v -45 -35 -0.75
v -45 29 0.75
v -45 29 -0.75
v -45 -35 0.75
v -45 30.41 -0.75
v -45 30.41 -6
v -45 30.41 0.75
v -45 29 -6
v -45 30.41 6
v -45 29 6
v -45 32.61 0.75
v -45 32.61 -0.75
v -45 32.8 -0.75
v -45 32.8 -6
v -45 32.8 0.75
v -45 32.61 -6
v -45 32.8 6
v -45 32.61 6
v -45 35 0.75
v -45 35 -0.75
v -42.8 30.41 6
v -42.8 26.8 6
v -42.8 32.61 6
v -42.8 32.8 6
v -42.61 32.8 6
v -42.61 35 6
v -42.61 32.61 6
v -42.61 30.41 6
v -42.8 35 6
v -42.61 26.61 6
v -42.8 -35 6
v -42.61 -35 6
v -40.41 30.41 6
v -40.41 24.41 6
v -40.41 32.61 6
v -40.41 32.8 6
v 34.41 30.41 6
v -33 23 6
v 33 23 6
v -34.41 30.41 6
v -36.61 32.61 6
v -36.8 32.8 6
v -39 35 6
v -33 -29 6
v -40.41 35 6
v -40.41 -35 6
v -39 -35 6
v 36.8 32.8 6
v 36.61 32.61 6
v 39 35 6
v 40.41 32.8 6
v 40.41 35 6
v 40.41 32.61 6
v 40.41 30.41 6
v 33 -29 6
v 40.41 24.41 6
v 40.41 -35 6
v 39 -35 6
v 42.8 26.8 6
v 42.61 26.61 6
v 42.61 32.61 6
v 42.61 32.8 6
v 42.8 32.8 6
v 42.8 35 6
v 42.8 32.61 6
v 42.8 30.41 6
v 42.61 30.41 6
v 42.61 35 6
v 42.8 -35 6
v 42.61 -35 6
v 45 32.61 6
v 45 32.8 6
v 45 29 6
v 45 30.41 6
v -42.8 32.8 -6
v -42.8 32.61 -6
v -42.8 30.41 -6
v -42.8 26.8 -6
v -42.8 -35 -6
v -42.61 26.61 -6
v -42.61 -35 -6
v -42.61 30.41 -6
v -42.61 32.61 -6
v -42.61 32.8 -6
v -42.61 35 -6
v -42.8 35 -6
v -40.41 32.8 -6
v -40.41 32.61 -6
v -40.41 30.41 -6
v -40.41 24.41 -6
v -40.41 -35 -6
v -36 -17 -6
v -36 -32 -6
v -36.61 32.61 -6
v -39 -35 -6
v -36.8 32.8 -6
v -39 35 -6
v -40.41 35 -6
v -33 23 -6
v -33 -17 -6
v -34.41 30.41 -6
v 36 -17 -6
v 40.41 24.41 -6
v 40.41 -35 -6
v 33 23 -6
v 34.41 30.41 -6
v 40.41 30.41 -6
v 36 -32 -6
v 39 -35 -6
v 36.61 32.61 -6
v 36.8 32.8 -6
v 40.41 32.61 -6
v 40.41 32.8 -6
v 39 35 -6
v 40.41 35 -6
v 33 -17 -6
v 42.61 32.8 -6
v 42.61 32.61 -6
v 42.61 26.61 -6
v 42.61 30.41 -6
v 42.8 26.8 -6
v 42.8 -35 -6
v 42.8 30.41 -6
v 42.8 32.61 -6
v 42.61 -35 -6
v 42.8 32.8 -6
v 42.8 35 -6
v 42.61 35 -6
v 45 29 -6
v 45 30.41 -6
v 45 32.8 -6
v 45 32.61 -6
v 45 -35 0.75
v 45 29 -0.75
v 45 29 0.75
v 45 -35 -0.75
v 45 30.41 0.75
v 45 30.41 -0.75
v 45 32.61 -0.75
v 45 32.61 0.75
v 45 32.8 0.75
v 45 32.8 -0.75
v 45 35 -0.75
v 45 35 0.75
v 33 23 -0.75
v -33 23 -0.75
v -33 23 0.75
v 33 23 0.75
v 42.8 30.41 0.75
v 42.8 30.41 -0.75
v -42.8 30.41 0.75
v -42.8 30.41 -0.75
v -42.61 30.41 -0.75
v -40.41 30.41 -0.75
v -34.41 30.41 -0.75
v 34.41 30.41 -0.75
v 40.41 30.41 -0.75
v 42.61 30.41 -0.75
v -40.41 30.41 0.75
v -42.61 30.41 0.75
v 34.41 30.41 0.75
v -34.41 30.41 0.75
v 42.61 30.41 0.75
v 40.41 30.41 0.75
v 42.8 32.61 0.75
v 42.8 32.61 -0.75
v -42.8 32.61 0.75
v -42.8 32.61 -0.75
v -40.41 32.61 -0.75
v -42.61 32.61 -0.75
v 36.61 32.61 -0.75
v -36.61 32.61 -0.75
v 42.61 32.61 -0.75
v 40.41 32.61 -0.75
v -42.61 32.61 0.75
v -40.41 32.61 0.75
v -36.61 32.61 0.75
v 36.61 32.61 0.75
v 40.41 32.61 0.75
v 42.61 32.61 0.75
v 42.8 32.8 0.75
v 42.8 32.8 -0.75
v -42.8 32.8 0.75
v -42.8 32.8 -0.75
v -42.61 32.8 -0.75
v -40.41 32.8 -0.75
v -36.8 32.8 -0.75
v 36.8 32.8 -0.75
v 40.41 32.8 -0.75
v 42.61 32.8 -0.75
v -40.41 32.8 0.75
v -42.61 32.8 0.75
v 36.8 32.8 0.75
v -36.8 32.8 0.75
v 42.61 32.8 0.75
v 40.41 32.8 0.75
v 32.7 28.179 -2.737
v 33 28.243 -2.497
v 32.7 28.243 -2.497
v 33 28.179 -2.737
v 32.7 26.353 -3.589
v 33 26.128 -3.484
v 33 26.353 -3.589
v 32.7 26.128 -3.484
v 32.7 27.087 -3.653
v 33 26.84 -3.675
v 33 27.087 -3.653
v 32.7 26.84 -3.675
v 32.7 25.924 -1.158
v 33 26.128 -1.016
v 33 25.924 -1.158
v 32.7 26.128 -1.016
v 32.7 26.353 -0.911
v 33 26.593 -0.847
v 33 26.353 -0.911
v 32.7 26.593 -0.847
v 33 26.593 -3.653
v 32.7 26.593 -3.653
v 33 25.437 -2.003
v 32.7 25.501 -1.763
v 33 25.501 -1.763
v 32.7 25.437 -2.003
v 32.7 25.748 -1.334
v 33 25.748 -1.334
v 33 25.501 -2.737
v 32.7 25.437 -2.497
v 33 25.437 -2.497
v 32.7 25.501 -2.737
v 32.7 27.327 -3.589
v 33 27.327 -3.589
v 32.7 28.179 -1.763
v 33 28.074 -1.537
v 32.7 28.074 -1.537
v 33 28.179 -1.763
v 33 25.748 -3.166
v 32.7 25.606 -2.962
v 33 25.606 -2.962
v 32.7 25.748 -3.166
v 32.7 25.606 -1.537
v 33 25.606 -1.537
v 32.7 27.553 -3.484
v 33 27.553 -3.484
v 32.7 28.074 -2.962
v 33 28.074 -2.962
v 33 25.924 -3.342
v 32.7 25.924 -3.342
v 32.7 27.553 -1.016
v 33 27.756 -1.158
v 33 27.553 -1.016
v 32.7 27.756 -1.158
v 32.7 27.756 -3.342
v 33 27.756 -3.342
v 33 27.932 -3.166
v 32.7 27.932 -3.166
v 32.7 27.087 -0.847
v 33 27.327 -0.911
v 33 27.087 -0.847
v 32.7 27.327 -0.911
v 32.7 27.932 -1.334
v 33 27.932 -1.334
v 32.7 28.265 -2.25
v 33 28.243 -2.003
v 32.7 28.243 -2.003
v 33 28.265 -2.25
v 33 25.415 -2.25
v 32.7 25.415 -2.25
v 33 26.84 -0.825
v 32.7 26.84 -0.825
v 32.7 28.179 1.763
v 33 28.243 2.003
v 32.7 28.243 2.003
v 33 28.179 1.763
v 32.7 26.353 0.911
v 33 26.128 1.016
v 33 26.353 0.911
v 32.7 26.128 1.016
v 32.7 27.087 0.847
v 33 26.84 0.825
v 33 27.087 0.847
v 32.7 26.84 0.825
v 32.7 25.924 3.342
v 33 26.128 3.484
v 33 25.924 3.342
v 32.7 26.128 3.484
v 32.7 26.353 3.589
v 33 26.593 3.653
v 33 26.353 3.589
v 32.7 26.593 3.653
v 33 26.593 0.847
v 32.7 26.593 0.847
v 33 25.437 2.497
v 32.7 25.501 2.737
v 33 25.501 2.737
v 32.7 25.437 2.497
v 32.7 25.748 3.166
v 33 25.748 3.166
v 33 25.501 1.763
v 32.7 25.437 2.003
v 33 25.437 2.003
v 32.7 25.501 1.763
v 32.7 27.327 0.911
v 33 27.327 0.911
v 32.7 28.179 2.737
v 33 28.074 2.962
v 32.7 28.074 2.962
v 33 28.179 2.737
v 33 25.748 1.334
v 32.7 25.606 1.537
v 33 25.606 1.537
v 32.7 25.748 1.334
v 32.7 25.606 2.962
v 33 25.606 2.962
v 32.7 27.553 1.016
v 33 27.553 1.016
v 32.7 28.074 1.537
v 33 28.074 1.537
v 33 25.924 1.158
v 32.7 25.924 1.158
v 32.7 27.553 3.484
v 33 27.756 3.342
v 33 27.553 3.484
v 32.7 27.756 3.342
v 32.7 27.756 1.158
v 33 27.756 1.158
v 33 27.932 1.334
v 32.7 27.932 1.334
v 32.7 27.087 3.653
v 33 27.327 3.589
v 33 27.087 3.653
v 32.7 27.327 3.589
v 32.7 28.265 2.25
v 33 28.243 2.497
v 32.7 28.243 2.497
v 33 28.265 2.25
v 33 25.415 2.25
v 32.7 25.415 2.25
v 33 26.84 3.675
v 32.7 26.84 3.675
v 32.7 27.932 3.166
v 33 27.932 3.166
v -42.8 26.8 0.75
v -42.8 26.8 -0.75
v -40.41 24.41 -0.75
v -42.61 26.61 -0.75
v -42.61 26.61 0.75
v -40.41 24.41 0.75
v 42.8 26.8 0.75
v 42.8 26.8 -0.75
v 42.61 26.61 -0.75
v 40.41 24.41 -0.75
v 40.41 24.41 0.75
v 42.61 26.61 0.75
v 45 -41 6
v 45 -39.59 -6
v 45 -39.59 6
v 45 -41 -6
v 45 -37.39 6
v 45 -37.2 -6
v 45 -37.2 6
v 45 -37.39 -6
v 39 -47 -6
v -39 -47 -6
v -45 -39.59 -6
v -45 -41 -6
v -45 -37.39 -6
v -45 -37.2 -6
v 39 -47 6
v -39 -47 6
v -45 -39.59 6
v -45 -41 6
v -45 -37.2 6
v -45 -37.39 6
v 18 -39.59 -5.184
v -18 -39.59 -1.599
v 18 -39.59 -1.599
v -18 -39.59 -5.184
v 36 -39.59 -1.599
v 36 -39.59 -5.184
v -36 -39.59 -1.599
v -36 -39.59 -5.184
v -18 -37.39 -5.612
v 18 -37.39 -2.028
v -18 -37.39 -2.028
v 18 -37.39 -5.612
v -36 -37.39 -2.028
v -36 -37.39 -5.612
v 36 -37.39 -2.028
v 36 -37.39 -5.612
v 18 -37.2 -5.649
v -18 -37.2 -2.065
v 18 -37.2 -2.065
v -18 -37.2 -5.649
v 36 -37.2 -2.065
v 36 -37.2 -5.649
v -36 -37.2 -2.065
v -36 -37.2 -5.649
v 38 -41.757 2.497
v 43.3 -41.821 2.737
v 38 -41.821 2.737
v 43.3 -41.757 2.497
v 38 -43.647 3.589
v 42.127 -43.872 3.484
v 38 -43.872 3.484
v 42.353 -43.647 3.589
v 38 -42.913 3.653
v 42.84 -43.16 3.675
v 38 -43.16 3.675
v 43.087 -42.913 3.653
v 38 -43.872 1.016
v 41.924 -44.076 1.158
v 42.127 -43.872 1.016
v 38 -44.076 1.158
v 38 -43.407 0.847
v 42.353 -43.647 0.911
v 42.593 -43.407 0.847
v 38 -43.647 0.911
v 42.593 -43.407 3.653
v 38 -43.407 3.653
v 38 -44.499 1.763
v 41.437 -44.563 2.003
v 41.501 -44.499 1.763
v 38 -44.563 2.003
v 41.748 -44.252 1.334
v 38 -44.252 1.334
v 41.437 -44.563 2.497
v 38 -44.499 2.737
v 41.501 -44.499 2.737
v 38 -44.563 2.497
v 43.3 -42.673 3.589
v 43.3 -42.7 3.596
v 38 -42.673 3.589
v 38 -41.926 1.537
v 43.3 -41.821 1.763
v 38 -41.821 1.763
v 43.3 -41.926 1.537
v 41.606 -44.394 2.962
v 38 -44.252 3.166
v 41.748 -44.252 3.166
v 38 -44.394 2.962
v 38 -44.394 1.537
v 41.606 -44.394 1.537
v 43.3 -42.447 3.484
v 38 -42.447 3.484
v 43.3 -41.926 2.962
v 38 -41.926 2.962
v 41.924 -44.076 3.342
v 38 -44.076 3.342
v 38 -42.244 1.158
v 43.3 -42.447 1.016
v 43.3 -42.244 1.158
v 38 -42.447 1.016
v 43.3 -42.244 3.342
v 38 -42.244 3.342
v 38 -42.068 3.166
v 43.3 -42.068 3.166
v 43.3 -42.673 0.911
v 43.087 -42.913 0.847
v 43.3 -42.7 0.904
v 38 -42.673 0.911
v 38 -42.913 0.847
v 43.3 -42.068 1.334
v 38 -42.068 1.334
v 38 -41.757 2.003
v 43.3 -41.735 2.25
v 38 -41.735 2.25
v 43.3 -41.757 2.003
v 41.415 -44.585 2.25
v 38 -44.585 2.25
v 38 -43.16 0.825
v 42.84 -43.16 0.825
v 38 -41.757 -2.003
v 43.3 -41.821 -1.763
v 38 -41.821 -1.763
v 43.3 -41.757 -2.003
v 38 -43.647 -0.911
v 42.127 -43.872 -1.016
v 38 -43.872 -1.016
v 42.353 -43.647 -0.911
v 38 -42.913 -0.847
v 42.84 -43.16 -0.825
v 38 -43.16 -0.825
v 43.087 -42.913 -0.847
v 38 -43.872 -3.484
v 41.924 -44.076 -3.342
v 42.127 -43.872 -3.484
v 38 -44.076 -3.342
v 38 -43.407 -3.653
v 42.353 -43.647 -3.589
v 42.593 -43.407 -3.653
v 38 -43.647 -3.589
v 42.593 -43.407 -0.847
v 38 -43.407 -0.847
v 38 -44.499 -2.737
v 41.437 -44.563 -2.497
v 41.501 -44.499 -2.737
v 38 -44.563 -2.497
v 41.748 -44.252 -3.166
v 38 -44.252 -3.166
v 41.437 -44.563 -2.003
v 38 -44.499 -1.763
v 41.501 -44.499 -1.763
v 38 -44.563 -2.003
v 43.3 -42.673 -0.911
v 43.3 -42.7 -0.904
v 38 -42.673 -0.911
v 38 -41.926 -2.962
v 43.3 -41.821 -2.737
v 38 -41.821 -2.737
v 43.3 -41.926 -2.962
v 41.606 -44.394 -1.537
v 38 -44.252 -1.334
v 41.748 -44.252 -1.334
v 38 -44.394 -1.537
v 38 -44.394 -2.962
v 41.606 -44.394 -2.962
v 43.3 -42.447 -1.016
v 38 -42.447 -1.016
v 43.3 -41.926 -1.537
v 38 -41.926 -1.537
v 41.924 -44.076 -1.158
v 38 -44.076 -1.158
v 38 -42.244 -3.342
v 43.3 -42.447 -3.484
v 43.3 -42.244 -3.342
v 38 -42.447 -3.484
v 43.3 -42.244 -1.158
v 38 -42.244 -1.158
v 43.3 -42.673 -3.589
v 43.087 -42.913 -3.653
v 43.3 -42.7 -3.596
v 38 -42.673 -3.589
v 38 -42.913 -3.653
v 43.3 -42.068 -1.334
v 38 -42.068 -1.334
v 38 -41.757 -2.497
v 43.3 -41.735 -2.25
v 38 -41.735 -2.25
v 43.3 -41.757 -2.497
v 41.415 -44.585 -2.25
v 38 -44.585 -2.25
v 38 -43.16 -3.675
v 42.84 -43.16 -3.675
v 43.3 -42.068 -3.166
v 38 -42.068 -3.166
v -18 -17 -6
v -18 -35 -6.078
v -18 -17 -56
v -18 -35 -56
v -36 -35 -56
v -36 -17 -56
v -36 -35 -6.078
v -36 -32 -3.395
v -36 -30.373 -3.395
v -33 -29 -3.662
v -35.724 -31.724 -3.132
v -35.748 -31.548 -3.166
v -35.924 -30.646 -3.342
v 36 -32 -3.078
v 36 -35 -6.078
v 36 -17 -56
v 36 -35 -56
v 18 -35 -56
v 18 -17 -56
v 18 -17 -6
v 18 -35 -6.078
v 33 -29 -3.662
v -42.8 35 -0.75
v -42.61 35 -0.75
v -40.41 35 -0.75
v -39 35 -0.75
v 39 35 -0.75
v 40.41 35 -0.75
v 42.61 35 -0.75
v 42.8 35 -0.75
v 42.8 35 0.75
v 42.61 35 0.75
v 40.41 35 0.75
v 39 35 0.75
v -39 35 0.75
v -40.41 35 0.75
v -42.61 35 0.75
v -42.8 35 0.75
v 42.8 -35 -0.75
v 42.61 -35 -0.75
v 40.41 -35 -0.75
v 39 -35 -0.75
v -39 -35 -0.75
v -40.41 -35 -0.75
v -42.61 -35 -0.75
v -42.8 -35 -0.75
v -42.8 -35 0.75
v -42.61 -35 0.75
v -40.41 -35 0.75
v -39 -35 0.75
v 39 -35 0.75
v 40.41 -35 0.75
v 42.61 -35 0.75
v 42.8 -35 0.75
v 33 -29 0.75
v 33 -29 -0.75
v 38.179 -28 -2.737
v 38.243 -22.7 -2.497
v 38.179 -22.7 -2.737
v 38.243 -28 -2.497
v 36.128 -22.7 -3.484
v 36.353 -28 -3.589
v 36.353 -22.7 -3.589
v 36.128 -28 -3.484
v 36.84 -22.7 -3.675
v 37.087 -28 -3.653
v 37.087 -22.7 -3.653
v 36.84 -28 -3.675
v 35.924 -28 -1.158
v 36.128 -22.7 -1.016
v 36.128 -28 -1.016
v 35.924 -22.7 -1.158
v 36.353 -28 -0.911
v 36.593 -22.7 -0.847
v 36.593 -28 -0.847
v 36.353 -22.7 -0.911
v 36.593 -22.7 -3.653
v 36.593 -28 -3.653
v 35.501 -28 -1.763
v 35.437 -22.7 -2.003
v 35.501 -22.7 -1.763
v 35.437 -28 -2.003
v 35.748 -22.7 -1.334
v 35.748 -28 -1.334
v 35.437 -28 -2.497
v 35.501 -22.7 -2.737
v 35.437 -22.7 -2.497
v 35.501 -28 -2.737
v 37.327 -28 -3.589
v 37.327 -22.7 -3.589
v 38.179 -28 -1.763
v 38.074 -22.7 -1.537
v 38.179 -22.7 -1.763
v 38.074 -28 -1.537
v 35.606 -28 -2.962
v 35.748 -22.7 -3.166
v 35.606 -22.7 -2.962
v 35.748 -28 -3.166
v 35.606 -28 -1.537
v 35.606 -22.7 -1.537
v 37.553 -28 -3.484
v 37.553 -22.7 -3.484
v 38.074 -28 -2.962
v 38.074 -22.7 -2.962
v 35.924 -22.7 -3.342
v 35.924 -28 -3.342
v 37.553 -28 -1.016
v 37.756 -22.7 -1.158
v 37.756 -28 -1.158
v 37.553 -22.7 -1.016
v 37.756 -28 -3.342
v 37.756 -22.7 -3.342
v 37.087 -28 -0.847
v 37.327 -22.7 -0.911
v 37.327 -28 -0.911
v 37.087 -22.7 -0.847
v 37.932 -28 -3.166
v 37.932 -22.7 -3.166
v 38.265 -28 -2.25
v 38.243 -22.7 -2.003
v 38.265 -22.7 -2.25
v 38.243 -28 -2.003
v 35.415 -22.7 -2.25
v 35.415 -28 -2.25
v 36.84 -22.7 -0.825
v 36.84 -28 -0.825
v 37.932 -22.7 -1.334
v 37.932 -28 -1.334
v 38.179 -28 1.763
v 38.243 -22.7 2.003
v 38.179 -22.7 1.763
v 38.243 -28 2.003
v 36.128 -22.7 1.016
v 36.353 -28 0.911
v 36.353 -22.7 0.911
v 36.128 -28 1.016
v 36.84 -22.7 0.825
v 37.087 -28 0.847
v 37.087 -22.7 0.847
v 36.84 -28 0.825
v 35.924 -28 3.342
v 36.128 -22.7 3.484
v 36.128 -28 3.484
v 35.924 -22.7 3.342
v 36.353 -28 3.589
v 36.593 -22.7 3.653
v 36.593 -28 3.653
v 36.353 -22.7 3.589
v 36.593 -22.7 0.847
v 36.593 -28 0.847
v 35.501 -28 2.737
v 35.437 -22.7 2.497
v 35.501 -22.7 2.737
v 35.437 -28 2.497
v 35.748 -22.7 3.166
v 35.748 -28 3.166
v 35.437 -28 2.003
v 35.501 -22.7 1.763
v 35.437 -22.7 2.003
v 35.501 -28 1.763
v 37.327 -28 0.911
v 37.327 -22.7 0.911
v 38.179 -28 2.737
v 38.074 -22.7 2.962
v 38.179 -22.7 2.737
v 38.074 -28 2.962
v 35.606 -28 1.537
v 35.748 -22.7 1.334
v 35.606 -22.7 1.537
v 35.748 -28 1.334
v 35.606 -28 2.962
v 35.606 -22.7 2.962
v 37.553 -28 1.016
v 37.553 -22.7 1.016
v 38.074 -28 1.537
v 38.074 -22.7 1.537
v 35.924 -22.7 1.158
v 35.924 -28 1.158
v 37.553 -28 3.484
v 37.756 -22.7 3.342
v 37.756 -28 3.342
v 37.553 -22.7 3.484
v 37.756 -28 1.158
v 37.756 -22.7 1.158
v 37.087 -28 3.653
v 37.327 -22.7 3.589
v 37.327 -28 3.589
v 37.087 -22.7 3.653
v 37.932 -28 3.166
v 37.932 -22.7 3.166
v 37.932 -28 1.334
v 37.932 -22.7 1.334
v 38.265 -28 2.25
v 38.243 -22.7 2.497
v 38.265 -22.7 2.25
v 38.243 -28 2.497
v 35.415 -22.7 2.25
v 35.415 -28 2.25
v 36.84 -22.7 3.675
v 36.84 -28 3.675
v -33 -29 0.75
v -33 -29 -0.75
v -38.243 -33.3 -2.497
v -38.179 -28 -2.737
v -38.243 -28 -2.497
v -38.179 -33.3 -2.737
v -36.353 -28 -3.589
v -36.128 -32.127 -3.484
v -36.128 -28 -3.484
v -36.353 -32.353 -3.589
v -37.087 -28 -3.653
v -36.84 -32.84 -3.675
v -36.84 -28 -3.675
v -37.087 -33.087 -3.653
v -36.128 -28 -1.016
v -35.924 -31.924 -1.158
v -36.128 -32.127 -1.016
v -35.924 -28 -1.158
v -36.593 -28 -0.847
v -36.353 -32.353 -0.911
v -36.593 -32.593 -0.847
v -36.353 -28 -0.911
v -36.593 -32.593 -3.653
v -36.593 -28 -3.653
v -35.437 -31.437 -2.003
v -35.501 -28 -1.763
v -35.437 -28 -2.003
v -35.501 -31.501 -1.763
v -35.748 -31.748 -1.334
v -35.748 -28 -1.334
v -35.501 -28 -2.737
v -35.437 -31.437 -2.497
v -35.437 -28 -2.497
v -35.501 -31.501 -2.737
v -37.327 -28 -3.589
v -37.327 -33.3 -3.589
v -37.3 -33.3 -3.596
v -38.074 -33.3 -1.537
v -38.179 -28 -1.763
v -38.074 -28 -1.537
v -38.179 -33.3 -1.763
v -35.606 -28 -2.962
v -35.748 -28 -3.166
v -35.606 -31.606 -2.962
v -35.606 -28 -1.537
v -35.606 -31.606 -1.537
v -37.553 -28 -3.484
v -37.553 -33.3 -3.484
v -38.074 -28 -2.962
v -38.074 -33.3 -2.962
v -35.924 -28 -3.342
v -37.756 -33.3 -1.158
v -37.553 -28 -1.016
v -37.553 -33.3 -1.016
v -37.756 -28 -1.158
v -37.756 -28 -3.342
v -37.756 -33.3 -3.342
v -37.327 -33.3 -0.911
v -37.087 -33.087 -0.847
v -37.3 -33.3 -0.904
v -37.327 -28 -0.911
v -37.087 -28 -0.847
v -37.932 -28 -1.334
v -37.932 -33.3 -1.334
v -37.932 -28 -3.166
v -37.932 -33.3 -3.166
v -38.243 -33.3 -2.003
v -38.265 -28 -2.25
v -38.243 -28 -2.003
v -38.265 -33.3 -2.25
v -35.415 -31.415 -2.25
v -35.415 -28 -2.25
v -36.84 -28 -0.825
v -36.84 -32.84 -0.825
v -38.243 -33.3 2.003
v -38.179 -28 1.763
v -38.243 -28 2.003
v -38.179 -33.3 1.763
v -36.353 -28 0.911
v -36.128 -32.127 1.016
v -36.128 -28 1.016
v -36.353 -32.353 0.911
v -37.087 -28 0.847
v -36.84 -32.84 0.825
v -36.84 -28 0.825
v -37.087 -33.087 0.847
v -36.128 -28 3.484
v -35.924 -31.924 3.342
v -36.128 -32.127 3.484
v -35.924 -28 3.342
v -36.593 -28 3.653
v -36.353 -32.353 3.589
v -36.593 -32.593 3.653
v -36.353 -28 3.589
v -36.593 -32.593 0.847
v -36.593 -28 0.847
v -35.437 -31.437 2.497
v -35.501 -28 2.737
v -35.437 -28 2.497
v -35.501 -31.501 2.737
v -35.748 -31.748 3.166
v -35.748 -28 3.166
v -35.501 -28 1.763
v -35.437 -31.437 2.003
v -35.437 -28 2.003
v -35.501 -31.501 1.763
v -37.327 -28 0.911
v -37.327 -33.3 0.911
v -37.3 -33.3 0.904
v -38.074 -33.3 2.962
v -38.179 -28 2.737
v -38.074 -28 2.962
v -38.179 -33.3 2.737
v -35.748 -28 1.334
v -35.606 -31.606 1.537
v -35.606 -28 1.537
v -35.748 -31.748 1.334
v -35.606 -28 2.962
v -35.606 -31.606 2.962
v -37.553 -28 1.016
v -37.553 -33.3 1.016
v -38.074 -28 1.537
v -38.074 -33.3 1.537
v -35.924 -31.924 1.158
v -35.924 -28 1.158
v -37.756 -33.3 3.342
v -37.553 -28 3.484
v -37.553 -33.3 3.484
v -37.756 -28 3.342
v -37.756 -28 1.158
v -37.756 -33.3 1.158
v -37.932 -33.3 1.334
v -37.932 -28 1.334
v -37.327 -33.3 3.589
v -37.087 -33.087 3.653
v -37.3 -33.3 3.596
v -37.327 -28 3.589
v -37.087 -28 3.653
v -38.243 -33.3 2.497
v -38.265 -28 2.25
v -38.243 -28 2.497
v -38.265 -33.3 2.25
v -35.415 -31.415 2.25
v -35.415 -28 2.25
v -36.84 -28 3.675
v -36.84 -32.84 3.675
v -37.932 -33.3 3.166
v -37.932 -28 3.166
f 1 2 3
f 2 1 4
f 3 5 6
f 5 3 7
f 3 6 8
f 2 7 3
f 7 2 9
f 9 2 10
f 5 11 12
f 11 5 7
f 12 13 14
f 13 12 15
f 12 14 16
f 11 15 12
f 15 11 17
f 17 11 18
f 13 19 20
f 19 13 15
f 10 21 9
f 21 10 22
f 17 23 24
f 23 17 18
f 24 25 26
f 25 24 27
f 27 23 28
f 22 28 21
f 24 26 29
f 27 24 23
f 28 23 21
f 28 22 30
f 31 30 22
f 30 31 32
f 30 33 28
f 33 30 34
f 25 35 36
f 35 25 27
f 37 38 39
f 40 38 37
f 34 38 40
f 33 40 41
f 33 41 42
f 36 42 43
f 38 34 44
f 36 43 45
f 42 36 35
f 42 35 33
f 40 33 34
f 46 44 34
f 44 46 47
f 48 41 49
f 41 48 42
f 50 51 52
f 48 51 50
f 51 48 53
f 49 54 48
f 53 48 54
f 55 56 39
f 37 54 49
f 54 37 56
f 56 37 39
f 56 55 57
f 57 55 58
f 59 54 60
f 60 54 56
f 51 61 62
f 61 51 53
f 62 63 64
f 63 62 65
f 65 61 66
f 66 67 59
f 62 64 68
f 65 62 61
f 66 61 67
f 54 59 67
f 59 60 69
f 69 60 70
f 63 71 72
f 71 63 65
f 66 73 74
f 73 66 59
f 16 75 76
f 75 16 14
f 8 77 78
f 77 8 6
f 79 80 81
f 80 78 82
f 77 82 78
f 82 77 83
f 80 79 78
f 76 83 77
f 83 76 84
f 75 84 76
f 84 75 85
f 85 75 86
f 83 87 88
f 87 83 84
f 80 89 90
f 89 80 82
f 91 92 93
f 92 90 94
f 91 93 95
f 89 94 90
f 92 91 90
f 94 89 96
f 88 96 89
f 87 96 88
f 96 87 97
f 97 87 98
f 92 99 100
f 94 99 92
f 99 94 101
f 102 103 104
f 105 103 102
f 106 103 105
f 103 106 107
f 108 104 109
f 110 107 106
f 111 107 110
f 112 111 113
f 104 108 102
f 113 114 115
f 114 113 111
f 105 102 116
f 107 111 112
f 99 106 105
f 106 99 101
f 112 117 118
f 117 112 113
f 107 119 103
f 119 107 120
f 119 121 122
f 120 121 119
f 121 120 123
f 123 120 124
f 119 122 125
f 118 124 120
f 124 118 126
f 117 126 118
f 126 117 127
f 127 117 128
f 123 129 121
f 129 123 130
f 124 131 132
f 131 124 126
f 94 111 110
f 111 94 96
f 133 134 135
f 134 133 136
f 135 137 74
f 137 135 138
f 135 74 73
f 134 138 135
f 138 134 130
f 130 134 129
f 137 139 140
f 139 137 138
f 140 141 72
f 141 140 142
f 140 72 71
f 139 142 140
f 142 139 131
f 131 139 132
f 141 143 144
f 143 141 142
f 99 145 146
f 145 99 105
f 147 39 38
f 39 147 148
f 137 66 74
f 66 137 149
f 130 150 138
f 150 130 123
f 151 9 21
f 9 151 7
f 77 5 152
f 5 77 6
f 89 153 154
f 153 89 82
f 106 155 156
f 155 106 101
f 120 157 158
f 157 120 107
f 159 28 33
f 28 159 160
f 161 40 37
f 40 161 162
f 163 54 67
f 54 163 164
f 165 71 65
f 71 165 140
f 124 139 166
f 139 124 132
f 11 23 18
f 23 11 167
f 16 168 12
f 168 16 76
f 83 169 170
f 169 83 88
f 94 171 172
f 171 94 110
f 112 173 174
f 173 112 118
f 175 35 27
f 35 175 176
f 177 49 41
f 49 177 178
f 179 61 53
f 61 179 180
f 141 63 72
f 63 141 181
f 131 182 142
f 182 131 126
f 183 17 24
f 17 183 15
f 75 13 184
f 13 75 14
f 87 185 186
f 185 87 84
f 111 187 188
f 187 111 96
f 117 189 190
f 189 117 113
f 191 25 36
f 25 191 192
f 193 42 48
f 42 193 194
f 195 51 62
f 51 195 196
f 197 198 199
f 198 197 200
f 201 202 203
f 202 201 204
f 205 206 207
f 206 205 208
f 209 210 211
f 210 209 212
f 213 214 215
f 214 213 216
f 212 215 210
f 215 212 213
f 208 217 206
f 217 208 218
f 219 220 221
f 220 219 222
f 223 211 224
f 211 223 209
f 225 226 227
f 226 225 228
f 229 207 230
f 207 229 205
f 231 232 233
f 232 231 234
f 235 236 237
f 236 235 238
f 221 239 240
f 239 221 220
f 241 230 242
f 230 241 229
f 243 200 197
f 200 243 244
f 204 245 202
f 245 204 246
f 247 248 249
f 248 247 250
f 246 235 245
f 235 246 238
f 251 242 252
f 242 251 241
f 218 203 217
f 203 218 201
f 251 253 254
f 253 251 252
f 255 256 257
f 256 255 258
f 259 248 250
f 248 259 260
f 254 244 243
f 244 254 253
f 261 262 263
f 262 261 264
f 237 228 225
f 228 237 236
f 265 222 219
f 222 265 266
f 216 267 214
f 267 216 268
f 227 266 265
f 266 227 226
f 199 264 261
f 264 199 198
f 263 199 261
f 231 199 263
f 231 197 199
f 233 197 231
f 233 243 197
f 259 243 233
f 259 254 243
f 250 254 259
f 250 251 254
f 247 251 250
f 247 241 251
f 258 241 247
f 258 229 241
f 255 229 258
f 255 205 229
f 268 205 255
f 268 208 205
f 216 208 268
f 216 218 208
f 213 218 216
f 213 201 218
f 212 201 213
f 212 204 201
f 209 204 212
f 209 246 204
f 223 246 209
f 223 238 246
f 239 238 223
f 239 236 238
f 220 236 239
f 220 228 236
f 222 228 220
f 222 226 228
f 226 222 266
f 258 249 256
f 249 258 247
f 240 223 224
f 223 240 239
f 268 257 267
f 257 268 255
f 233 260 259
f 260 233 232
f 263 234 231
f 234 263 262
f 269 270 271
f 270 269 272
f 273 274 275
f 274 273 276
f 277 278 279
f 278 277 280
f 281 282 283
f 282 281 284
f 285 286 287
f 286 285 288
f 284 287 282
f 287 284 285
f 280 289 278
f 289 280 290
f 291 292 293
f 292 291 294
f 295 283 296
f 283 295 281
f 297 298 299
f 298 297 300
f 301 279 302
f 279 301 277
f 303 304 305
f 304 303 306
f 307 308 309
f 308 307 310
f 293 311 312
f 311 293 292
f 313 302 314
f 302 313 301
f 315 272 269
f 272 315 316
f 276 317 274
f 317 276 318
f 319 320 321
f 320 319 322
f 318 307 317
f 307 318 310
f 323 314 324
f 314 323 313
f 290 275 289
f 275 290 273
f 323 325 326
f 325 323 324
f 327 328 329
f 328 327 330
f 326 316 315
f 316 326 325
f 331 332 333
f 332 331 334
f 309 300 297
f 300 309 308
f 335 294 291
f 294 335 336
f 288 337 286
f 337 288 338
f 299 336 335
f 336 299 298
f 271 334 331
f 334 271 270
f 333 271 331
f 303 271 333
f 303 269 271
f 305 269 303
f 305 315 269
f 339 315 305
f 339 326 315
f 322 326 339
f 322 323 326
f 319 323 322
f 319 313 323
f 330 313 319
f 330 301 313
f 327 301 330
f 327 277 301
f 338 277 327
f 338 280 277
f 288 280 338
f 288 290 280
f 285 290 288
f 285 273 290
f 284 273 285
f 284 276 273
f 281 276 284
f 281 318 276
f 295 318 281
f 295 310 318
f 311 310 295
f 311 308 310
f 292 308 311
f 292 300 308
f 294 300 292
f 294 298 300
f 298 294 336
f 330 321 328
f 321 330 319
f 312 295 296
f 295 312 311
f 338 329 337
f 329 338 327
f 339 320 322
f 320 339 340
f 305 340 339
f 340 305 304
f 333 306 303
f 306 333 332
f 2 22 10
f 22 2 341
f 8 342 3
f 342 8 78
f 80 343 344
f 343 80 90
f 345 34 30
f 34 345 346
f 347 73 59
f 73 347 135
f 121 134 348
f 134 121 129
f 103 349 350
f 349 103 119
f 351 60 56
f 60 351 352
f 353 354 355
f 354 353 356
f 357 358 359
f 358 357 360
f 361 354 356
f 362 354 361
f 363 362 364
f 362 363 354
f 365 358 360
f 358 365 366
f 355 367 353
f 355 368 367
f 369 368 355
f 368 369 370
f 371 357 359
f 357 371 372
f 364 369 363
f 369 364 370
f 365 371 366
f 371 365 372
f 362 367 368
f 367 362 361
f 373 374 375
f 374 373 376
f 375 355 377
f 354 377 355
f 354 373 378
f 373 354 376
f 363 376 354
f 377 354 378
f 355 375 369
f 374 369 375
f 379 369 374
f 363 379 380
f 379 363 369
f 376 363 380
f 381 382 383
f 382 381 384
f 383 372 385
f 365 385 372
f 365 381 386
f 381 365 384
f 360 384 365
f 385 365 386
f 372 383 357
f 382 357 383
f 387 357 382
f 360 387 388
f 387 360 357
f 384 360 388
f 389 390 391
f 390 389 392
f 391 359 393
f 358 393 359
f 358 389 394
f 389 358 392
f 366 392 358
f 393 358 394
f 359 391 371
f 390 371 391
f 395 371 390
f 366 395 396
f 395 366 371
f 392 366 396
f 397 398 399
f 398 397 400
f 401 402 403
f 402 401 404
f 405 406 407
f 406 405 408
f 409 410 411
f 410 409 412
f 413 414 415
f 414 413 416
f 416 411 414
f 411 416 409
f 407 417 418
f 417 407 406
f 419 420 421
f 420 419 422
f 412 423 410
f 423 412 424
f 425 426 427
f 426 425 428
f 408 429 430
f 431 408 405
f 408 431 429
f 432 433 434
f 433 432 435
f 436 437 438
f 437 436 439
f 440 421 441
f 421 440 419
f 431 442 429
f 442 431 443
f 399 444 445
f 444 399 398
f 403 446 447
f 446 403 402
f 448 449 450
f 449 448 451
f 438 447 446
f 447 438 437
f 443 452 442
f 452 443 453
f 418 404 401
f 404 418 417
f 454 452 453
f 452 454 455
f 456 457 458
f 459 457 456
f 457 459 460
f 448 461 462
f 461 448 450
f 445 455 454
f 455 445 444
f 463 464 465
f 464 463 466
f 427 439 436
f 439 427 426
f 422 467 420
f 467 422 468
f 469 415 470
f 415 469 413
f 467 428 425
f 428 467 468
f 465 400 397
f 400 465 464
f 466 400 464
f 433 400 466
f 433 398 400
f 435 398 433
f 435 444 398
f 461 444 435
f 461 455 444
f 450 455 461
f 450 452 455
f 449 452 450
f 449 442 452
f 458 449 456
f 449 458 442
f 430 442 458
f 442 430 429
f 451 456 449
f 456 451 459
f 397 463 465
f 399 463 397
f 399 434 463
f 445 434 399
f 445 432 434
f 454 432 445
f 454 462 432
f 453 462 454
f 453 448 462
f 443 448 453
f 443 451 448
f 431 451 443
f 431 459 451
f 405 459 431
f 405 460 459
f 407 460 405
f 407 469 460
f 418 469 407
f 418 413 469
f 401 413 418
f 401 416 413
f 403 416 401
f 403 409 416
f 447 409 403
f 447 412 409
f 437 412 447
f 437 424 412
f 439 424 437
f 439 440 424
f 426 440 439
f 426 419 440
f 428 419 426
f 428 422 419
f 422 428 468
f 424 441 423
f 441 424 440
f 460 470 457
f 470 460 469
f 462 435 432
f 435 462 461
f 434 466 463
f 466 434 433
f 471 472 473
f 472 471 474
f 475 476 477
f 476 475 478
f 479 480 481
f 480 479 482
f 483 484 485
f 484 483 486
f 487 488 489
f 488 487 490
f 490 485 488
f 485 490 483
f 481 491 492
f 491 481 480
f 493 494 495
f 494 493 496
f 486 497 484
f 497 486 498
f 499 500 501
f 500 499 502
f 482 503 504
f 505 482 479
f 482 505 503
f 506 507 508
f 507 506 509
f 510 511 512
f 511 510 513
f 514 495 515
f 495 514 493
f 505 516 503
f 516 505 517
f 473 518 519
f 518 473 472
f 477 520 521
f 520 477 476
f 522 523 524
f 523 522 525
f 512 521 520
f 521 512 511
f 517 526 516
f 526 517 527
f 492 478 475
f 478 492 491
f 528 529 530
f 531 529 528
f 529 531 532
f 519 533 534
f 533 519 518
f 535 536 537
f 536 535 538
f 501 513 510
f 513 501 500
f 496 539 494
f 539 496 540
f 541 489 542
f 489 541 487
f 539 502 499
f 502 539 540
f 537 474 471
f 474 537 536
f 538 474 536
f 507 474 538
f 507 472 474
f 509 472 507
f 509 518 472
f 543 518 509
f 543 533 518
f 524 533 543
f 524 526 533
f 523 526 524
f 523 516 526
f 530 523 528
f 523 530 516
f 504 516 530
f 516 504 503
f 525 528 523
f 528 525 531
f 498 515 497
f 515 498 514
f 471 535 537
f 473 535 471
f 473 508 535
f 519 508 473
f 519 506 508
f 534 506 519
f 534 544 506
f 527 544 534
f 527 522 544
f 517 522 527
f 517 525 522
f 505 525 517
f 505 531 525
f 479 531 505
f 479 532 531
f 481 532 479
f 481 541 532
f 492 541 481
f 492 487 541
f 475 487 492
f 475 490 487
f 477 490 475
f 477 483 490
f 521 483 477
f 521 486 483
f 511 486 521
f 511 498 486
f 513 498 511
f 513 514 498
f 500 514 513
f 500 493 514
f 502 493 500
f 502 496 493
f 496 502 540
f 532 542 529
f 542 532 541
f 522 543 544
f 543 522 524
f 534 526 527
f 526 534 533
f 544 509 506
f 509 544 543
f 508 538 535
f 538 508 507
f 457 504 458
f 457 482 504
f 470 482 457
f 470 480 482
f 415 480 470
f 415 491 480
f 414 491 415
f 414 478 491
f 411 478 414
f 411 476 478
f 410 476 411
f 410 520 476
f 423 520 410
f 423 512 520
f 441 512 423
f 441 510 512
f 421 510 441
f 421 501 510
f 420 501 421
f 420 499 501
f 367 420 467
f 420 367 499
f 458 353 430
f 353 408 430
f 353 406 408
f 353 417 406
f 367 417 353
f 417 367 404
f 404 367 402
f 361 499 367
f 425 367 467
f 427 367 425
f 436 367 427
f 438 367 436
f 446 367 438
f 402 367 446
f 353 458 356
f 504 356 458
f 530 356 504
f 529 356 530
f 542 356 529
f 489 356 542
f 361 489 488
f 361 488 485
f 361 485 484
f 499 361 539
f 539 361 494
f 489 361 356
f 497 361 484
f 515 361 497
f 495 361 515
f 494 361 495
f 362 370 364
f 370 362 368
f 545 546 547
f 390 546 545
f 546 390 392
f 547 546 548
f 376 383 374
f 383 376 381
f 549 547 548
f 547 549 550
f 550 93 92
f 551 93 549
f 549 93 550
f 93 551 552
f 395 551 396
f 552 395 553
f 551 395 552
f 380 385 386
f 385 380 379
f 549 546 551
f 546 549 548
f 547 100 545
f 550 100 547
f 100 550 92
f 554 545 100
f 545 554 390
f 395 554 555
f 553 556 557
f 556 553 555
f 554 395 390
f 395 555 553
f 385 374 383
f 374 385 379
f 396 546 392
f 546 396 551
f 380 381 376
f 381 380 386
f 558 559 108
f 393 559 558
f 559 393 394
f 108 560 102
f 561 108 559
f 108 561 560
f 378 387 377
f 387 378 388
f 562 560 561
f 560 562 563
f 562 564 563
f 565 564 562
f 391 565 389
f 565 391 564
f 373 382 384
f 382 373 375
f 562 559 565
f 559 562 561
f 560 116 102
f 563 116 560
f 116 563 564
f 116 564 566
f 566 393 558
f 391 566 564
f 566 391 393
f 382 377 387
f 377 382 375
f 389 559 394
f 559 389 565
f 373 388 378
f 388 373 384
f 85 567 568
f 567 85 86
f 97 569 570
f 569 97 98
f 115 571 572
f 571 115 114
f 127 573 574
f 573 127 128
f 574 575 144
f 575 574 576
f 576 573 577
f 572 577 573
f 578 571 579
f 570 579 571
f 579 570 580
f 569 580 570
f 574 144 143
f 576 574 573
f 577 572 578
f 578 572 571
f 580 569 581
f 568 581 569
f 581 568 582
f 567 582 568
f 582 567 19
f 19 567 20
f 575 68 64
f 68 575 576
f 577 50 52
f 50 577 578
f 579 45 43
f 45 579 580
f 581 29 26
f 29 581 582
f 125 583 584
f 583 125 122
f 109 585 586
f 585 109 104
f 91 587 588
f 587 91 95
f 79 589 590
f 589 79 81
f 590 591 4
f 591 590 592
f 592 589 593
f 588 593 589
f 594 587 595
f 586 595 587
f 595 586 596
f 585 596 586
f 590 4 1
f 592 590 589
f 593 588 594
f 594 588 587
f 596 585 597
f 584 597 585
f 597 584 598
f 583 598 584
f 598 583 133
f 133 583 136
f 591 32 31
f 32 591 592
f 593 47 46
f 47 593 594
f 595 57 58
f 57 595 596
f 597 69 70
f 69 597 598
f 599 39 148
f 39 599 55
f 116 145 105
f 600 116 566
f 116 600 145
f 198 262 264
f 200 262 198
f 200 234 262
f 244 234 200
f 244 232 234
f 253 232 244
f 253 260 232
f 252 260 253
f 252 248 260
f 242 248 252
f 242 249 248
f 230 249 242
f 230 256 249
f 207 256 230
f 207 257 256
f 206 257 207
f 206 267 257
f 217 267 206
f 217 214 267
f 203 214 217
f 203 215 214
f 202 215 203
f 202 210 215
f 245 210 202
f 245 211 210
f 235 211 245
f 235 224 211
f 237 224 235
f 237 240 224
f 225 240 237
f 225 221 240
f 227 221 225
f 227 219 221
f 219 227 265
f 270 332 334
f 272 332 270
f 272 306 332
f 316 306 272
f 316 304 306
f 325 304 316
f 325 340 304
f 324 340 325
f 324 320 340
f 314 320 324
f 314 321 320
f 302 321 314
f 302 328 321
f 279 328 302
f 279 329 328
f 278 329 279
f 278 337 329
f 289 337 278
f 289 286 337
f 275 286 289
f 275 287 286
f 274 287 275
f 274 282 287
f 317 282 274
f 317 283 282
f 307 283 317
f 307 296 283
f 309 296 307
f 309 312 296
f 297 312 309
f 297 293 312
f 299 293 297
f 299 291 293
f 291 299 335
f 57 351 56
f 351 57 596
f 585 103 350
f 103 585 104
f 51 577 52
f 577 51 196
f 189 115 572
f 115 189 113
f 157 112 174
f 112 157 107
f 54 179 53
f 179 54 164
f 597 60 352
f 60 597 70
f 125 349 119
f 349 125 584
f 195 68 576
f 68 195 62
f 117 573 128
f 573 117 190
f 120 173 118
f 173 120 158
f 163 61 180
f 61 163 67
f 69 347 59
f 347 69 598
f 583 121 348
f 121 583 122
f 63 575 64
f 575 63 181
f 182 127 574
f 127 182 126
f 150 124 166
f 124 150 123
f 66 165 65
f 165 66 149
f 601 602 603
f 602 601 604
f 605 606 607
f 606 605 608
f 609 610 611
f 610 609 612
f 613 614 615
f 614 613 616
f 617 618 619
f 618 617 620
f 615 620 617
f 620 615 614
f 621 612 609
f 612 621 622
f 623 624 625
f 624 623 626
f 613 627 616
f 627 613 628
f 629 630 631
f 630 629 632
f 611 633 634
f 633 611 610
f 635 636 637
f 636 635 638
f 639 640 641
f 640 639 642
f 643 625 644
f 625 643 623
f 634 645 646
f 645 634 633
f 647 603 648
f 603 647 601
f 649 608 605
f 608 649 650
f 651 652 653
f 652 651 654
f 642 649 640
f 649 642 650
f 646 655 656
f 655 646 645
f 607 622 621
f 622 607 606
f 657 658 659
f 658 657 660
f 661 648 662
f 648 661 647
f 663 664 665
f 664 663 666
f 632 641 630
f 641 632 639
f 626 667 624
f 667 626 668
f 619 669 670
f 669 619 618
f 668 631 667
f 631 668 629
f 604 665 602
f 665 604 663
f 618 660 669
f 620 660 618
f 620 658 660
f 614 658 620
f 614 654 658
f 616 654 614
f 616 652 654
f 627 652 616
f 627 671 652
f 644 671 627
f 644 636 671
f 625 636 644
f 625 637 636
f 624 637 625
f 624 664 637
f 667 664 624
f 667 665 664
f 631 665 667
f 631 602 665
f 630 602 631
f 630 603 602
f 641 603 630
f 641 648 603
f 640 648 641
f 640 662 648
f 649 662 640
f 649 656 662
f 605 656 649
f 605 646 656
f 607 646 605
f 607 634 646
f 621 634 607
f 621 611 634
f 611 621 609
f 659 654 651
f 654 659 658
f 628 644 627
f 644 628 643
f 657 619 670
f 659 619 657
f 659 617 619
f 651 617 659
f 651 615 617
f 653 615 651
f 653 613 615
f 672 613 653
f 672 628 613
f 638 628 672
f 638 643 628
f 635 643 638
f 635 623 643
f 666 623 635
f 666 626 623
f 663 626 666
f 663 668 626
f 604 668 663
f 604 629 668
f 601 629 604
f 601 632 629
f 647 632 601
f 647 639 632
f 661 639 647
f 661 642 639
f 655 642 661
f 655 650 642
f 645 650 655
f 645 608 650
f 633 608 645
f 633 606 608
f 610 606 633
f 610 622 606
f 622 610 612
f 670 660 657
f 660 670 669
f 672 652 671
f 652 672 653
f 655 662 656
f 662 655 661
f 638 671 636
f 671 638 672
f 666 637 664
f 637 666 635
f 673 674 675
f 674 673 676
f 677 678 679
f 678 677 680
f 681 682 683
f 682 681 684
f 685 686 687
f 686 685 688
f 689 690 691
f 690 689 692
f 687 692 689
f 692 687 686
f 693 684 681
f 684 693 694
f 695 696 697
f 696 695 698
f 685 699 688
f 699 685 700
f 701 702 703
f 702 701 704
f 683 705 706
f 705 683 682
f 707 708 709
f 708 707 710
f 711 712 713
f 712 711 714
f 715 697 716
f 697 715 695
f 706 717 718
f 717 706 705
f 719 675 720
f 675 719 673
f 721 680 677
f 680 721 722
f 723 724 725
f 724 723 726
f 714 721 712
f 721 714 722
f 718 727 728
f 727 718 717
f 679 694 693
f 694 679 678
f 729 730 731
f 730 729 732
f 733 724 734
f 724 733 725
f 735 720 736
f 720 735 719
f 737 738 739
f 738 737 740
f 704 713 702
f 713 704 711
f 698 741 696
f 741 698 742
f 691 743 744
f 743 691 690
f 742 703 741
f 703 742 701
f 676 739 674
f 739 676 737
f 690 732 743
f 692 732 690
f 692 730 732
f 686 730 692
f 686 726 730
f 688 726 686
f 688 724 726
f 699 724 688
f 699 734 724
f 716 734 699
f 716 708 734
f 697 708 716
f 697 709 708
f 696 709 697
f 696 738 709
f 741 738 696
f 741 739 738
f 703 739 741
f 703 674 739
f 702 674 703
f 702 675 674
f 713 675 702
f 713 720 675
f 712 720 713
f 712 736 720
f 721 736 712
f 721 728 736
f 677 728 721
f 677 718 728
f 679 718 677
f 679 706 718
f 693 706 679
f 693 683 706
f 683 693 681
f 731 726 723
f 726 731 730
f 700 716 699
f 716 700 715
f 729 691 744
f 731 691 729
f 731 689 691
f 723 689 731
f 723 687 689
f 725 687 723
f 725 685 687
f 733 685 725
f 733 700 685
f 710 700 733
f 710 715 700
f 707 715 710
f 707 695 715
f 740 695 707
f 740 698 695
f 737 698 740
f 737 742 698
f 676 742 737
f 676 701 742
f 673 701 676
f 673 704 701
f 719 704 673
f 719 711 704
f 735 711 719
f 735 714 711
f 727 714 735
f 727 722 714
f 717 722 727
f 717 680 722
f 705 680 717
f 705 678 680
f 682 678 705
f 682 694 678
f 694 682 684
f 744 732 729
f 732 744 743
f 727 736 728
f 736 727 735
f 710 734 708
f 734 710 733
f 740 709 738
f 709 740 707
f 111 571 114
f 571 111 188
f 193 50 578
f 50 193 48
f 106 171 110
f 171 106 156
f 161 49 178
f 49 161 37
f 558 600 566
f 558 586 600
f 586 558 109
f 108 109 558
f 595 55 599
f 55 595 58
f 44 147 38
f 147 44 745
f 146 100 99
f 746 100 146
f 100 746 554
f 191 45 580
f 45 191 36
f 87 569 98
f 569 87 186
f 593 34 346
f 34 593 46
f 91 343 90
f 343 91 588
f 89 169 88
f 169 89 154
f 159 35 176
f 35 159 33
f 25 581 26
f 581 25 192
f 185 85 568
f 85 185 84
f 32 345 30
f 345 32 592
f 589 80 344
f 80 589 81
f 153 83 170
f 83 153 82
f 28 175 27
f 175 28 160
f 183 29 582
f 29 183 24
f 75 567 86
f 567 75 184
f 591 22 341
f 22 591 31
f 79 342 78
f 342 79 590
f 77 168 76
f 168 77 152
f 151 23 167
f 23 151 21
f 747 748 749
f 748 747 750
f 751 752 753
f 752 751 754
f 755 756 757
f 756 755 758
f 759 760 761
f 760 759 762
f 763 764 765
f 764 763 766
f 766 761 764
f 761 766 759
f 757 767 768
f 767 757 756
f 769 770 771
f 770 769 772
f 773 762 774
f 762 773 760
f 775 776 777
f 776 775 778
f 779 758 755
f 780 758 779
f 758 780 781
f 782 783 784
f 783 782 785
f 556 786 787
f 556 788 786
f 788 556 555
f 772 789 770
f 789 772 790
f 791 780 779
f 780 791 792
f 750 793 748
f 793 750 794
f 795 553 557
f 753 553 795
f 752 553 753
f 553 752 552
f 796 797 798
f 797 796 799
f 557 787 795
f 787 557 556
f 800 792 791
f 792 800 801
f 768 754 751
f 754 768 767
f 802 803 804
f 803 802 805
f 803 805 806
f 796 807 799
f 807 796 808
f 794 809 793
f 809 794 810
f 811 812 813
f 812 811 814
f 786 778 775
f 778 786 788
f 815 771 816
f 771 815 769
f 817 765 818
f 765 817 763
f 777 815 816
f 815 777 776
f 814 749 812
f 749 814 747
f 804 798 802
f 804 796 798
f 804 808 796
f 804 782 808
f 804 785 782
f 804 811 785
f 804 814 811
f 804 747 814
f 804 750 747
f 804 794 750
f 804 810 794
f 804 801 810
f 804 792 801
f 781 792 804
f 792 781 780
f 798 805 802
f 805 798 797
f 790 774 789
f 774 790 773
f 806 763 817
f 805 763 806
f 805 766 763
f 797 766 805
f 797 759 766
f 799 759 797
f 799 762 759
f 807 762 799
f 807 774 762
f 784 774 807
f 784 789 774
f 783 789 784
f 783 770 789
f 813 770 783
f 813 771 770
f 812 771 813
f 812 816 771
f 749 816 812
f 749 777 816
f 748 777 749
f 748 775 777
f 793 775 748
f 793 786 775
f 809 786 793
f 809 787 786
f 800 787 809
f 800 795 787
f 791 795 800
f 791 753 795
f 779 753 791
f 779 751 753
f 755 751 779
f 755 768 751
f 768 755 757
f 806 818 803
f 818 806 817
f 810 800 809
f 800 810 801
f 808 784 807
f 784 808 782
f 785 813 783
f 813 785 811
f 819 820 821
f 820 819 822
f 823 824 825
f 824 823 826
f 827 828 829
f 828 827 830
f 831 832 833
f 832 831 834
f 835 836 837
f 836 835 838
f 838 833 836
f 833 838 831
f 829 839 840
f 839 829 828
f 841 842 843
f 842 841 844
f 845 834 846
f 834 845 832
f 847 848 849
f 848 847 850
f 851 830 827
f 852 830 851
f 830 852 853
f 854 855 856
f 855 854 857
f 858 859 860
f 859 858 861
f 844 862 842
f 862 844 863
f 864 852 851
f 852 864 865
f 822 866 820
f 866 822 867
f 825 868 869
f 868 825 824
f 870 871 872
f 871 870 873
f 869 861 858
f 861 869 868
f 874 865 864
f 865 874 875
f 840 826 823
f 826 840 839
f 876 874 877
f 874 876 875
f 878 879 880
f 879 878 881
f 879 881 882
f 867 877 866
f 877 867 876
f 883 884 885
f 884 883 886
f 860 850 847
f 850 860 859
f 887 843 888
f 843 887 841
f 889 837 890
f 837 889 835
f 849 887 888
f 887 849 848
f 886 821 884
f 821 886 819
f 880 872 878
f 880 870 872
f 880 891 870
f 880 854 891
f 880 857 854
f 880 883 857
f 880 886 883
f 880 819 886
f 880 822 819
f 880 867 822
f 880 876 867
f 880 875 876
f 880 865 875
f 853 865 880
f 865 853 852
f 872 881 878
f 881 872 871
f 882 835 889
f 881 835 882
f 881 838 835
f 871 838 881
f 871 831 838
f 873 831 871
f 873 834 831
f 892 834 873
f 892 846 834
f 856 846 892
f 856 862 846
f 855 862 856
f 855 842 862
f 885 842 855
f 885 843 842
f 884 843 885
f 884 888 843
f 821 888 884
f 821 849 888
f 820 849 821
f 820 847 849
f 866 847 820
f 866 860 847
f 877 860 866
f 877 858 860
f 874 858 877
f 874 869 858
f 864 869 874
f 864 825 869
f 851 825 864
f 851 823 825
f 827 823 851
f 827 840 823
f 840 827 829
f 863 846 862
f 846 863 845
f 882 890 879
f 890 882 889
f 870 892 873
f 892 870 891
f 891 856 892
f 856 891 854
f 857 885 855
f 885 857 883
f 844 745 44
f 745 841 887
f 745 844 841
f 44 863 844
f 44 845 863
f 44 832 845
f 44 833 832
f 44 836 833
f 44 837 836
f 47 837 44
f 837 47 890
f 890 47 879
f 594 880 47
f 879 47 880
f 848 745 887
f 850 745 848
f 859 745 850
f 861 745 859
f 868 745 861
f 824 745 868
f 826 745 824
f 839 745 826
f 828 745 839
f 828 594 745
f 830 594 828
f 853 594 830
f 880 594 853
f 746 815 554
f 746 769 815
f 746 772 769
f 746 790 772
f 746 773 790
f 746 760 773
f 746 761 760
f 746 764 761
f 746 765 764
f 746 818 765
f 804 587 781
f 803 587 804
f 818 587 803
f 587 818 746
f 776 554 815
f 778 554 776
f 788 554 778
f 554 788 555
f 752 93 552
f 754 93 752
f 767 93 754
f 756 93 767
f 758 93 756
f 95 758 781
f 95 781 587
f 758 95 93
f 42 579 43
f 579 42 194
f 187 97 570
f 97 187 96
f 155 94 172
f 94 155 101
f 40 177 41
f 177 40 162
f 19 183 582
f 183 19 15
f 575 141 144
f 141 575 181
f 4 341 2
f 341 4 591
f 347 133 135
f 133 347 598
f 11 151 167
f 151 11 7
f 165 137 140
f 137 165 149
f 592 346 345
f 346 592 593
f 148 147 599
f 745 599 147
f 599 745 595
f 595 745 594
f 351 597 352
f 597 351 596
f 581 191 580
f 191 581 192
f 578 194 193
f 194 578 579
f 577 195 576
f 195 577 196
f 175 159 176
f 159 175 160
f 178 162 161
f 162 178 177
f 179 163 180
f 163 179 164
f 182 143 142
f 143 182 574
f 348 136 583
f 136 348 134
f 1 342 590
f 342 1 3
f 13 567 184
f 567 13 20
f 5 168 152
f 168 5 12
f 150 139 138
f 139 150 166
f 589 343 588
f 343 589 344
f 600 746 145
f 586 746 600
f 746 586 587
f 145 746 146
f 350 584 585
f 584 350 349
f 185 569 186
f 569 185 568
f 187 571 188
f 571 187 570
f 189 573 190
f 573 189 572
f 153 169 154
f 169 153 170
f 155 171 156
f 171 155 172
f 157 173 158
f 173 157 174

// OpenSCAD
// 4-piece PCB picture-frame rails (U-channel) with 45° miters + peg/hole corners
// Fixes:
// - Assembly preview uses correct rail placement (no weird rotations)
// - "print_plate" lays all parts out separated so nothing intersects for printing
//
// PCB: 90 x 70 x 1.5 mm
// Units: mm

// ---------------- PCB ----------------
pcb_x  = 90;
pcb_y  = 70;
pcb_t  = 1.5;

// ---------------- Channel fit ----------------
slot_clear = 0.35;        // clearance around PCB thickness
slot_depth = 7.0;         // how deep PCB edge seats into channel (inward)
outer_depth = 12.0;       // rail depth (out of PCB plane)
outer_w = 14.0;           // rail face width (from inside edge outward)
outer_th = 12.0;          // rail thickness (in PCB plane, i.e., "border thickness")

// Slot geometry (U-channel)
slot_w = pcb_t + 2*slot_clear; // channel opening width

// ---------------- Miters ----------------
miter_deg = 45;

// ---------------- Pegs/Holes ----------------
peg_d     = 2.6;
peg_len   = 4.5;
peg_clear = 0.25;   // hole diameter = peg_d + peg_clear
peg_offset = 7.0;   // from miter plane inward
peg_sep   = 4.5;    // separation between the 2 pegs along depth
pegs_per_end = 2;   // 1 or 2

// ---------------- Legs (bottom rail only) ----------------
legs_enable = true;
leg_w   = 18.0;   // along rail length
leg_th  = 3.0;
leg_len = 50.0;   // sticks backward
leg_drop= 18.0;   // drops down (for stability)
leg_inset = 18.0; // from each end

// ---------------- Output ----------------
part = "assembly"; // "top","bottom","left","right","print_plate","assembly"

// ============================================================================
// Coordinate system for rails:
// - Rail length is along +X (in its local space)
// - PCB edge inserts along local -Y into the slot (slot opens to -Y)
// - Rail "border thickness" is along +Y (outside of PCB)
// - Rail depth (front/back) is along +Z
//
// Assembly places the PCB centered at origin in XY plane, thickness in Z.
// Rails are placed around PCB edges with their slot opening facing inward.
// ============================================================================

// ---------------- Helpers ----------------
module peg_or_hole(is_peg=true){
  d = is_peg ? peg_d : (peg_d + peg_clear);
  // peg/hole runs in X direction (into the mating rail end)
  rotate([0,90,0]) cylinder(d=d, h=(peg_len + (is_peg?0:0.8)), $fn=36);
}

module rail_blank(L){
  // Solid block: [L, outer_th, outer_depth] with the inside edge at Y=0
  // We build centered in Z, but with Y spanning [0..outer_th]
  translate([0, outer_th/2, 0])
    cube([L, outer_th, outer_depth], center=true);
}

module rail_with_slot(L){
  // Cut a U-channel that opens to -Y (inward) so the rail slides onto PCB edge
  difference(){
    rail_blank(L);

    // Slot position: near the inside edge (Y=0), centered in Z
    // Slot opens to -Y, so we subtract a box that protrudes past Y=0.
    translate([0, slot_depth/2 - 0.01, 0])
      cube([L+0.6, slot_w, outer_depth+0.6], center=true);

    // Make the mouth slightly wider for easier start
    translate([0, 0.8, 0])
      cube([L+0.6, slot_w + 0.6, outer_depth+0.6], center=true);
  }
}

module miter_cut(L, end=+1){
  // end=+1 cuts +X end, end=-1 cuts -X end
  // subtract an angled cutter
  translate([end*(L/2), outer_th/2, 0])
    rotate([0,0,end*miter_deg])
      translate([end*80, 0, 0])
        cube([160, outer_th*4, outer_depth*4], center=true);
}

module add_end_features(L, end=+1, male=true){
  // male=true => pegs, male=false => holes
  // place near the miter plane, inside the rail thickness
  x = end*(L/2 - peg_offset);

  for(i=[0:pegs_per_end-1]){
    dz = (pegs_per_end==1) ? 0 : (i==0 ? -peg_sep/2 : +peg_sep/2);
    translate([x, outer_th*0.68, dz])
      peg_or_hole(is_peg=male);
  }
}

module rail_part(L, male_end="+", female_end="-", is_bottom=false){
  // male_end / female_end: "+" means +X end, "-" means -X end
  difference(){
    union(){
      rail_with_slot(L);

      // Male pegs
      if (male_end == "+") add_end_features(L, end=+1, male=true);
      if (male_end == "-") add_end_features(L, end=-1, male=true);
    }

    // Miters
    miter_cut(L, end=+1);
    miter_cut(L, end=-1);

    // Female holes
    if (female_end == "+") add_end_features(L, end=+1, male=false);
    if (female_end == "-") add_end_features(L, end=-1, male=false);
  }

  // Legs only on bottom rail
  if (is_bottom && legs_enable){
    for (sx=[-1,1]){
      x = sx*(L/2 - leg_inset);
      // foot behind the rail (positive Z)
      translate([x, -leg_drop/2, outer_depth/2 + leg_len/2])
        cube([leg_w, leg_drop, leg_len], center=true);

      // brace
      hull(){
        translate([x, outer_th*0.55, outer_depth*0.25])
          cube([leg_w, leg_th, leg_th], center=true);
        translate([x, -leg_drop + leg_th/2, outer_depth/2 + leg_th/2])
          cube([leg_w, leg_th, leg_th], center=true);
      }
    }
  }
}

// ---------------- Specific rails ----------------
// Lengths are exactly PCB edge lengths; miters define corner join.
L_topbot = pcb_x;
L_leftrt = pcb_y;

// Convention for peg/hole directions so corners mate:
// - Top:    male at +X, female at -X
// - Right:  male at +X, female at -X   (after rotation, still consistent)
// - Bottom: male at -X, female at +X   (flipped)
// - Left:   male at -X, female at +X   (flipped)

module top_rail() {
  rail_part(L_topbot, male_end="+", female_end="-", is_bottom=false);
}
module bottom_rail() {
  rail_part(L_topbot, male_end="-", female_end="+", is_bottom=true);
}
module right_rail() {
  rail_part(L_leftrt, male_end="+", female_end="-", is_bottom=false);
}
module left_rail() {
  rail_part(L_leftrt, male_end="-", female_end="+", is_bottom=false);
}

// ---------------- Assembly preview ----------------
module assembly(){
  // PCB preview (flat)
  color([0,0.6,0,0.35]) cube([pcb_x, pcb_y, pcb_t], center=true);

  // Place rails around PCB edges.
  // Rails slide onto PCB edges: slot opens inward toward PCB.
  // For top rail, inward is -Y in rail local space, so we rotate it so -Y points toward PCB center.
  //
  // Top edge at +pcb_y/2:
  //   rotate rail 180° about Z so its slot opening faces downward (toward center).
  translate([0, +pcb_y/2, 0])
    rotate([0,0,180])
      top_rail();

  // Bottom edge at -pcb_y/2: slot already opens -Y, so keep as-is (toward center is +Y),
  // rotate 0 and translate; but we need inward to point +Y, so rotate 0 about Z is wrong.
  // Easiest: rotate 0? Actually slot opens -Y; we want it to open toward center which is +Y from bottom.
  // So rotate 180° about X flips Y direction:
  translate([0, -pcb_y/2, 0])
    rotate([180,0,0])
      bottom_rail();

  // Right edge at +pcb_x/2: rotate rail 90° so its length runs along Y.
  // Slot opens -Y (rail local), we want it to open toward center which is -X from right.
  translate([+pcb_x/2, 0, 0])
    rotate([0,0,90])
      right_rail();

  // Left edge at -pcb_x/2: slot should open toward center which is +X from left.
  translate([-pcb_x/2, 0, 0])
    rotate([0,0,-90])
      left_rail();
}

// ---------------- Print layout ----------------
module print_plate(){
  // Lay parts flat, separated, no intersections.
  // Rails sit with their "back" face on the bed (Z is thickness; we place at Z=outer_depth/2).
  gap = 18;

  translate([0, 0, 0])                 top_rail();
  translate([0, -(outer_th+gap), 0])   bottom_rail();

  translate([0, +(outer_th+gap), 0])   rotate([0,0,0]) right_rail();
  translate([0, +(2*(outer_th+gap)),0])rotate([0,0,0]) left_rail();
}

// ---------------- Output switch ----------------
if (part=="top")    top_rail();
if (part=="bottom") bottom_rail();
if (part=="right")  right_rail();
if (part=="left")   left_rail();
if (part=="print_plate") print_plate();
if (part=="assembly") assembly();
